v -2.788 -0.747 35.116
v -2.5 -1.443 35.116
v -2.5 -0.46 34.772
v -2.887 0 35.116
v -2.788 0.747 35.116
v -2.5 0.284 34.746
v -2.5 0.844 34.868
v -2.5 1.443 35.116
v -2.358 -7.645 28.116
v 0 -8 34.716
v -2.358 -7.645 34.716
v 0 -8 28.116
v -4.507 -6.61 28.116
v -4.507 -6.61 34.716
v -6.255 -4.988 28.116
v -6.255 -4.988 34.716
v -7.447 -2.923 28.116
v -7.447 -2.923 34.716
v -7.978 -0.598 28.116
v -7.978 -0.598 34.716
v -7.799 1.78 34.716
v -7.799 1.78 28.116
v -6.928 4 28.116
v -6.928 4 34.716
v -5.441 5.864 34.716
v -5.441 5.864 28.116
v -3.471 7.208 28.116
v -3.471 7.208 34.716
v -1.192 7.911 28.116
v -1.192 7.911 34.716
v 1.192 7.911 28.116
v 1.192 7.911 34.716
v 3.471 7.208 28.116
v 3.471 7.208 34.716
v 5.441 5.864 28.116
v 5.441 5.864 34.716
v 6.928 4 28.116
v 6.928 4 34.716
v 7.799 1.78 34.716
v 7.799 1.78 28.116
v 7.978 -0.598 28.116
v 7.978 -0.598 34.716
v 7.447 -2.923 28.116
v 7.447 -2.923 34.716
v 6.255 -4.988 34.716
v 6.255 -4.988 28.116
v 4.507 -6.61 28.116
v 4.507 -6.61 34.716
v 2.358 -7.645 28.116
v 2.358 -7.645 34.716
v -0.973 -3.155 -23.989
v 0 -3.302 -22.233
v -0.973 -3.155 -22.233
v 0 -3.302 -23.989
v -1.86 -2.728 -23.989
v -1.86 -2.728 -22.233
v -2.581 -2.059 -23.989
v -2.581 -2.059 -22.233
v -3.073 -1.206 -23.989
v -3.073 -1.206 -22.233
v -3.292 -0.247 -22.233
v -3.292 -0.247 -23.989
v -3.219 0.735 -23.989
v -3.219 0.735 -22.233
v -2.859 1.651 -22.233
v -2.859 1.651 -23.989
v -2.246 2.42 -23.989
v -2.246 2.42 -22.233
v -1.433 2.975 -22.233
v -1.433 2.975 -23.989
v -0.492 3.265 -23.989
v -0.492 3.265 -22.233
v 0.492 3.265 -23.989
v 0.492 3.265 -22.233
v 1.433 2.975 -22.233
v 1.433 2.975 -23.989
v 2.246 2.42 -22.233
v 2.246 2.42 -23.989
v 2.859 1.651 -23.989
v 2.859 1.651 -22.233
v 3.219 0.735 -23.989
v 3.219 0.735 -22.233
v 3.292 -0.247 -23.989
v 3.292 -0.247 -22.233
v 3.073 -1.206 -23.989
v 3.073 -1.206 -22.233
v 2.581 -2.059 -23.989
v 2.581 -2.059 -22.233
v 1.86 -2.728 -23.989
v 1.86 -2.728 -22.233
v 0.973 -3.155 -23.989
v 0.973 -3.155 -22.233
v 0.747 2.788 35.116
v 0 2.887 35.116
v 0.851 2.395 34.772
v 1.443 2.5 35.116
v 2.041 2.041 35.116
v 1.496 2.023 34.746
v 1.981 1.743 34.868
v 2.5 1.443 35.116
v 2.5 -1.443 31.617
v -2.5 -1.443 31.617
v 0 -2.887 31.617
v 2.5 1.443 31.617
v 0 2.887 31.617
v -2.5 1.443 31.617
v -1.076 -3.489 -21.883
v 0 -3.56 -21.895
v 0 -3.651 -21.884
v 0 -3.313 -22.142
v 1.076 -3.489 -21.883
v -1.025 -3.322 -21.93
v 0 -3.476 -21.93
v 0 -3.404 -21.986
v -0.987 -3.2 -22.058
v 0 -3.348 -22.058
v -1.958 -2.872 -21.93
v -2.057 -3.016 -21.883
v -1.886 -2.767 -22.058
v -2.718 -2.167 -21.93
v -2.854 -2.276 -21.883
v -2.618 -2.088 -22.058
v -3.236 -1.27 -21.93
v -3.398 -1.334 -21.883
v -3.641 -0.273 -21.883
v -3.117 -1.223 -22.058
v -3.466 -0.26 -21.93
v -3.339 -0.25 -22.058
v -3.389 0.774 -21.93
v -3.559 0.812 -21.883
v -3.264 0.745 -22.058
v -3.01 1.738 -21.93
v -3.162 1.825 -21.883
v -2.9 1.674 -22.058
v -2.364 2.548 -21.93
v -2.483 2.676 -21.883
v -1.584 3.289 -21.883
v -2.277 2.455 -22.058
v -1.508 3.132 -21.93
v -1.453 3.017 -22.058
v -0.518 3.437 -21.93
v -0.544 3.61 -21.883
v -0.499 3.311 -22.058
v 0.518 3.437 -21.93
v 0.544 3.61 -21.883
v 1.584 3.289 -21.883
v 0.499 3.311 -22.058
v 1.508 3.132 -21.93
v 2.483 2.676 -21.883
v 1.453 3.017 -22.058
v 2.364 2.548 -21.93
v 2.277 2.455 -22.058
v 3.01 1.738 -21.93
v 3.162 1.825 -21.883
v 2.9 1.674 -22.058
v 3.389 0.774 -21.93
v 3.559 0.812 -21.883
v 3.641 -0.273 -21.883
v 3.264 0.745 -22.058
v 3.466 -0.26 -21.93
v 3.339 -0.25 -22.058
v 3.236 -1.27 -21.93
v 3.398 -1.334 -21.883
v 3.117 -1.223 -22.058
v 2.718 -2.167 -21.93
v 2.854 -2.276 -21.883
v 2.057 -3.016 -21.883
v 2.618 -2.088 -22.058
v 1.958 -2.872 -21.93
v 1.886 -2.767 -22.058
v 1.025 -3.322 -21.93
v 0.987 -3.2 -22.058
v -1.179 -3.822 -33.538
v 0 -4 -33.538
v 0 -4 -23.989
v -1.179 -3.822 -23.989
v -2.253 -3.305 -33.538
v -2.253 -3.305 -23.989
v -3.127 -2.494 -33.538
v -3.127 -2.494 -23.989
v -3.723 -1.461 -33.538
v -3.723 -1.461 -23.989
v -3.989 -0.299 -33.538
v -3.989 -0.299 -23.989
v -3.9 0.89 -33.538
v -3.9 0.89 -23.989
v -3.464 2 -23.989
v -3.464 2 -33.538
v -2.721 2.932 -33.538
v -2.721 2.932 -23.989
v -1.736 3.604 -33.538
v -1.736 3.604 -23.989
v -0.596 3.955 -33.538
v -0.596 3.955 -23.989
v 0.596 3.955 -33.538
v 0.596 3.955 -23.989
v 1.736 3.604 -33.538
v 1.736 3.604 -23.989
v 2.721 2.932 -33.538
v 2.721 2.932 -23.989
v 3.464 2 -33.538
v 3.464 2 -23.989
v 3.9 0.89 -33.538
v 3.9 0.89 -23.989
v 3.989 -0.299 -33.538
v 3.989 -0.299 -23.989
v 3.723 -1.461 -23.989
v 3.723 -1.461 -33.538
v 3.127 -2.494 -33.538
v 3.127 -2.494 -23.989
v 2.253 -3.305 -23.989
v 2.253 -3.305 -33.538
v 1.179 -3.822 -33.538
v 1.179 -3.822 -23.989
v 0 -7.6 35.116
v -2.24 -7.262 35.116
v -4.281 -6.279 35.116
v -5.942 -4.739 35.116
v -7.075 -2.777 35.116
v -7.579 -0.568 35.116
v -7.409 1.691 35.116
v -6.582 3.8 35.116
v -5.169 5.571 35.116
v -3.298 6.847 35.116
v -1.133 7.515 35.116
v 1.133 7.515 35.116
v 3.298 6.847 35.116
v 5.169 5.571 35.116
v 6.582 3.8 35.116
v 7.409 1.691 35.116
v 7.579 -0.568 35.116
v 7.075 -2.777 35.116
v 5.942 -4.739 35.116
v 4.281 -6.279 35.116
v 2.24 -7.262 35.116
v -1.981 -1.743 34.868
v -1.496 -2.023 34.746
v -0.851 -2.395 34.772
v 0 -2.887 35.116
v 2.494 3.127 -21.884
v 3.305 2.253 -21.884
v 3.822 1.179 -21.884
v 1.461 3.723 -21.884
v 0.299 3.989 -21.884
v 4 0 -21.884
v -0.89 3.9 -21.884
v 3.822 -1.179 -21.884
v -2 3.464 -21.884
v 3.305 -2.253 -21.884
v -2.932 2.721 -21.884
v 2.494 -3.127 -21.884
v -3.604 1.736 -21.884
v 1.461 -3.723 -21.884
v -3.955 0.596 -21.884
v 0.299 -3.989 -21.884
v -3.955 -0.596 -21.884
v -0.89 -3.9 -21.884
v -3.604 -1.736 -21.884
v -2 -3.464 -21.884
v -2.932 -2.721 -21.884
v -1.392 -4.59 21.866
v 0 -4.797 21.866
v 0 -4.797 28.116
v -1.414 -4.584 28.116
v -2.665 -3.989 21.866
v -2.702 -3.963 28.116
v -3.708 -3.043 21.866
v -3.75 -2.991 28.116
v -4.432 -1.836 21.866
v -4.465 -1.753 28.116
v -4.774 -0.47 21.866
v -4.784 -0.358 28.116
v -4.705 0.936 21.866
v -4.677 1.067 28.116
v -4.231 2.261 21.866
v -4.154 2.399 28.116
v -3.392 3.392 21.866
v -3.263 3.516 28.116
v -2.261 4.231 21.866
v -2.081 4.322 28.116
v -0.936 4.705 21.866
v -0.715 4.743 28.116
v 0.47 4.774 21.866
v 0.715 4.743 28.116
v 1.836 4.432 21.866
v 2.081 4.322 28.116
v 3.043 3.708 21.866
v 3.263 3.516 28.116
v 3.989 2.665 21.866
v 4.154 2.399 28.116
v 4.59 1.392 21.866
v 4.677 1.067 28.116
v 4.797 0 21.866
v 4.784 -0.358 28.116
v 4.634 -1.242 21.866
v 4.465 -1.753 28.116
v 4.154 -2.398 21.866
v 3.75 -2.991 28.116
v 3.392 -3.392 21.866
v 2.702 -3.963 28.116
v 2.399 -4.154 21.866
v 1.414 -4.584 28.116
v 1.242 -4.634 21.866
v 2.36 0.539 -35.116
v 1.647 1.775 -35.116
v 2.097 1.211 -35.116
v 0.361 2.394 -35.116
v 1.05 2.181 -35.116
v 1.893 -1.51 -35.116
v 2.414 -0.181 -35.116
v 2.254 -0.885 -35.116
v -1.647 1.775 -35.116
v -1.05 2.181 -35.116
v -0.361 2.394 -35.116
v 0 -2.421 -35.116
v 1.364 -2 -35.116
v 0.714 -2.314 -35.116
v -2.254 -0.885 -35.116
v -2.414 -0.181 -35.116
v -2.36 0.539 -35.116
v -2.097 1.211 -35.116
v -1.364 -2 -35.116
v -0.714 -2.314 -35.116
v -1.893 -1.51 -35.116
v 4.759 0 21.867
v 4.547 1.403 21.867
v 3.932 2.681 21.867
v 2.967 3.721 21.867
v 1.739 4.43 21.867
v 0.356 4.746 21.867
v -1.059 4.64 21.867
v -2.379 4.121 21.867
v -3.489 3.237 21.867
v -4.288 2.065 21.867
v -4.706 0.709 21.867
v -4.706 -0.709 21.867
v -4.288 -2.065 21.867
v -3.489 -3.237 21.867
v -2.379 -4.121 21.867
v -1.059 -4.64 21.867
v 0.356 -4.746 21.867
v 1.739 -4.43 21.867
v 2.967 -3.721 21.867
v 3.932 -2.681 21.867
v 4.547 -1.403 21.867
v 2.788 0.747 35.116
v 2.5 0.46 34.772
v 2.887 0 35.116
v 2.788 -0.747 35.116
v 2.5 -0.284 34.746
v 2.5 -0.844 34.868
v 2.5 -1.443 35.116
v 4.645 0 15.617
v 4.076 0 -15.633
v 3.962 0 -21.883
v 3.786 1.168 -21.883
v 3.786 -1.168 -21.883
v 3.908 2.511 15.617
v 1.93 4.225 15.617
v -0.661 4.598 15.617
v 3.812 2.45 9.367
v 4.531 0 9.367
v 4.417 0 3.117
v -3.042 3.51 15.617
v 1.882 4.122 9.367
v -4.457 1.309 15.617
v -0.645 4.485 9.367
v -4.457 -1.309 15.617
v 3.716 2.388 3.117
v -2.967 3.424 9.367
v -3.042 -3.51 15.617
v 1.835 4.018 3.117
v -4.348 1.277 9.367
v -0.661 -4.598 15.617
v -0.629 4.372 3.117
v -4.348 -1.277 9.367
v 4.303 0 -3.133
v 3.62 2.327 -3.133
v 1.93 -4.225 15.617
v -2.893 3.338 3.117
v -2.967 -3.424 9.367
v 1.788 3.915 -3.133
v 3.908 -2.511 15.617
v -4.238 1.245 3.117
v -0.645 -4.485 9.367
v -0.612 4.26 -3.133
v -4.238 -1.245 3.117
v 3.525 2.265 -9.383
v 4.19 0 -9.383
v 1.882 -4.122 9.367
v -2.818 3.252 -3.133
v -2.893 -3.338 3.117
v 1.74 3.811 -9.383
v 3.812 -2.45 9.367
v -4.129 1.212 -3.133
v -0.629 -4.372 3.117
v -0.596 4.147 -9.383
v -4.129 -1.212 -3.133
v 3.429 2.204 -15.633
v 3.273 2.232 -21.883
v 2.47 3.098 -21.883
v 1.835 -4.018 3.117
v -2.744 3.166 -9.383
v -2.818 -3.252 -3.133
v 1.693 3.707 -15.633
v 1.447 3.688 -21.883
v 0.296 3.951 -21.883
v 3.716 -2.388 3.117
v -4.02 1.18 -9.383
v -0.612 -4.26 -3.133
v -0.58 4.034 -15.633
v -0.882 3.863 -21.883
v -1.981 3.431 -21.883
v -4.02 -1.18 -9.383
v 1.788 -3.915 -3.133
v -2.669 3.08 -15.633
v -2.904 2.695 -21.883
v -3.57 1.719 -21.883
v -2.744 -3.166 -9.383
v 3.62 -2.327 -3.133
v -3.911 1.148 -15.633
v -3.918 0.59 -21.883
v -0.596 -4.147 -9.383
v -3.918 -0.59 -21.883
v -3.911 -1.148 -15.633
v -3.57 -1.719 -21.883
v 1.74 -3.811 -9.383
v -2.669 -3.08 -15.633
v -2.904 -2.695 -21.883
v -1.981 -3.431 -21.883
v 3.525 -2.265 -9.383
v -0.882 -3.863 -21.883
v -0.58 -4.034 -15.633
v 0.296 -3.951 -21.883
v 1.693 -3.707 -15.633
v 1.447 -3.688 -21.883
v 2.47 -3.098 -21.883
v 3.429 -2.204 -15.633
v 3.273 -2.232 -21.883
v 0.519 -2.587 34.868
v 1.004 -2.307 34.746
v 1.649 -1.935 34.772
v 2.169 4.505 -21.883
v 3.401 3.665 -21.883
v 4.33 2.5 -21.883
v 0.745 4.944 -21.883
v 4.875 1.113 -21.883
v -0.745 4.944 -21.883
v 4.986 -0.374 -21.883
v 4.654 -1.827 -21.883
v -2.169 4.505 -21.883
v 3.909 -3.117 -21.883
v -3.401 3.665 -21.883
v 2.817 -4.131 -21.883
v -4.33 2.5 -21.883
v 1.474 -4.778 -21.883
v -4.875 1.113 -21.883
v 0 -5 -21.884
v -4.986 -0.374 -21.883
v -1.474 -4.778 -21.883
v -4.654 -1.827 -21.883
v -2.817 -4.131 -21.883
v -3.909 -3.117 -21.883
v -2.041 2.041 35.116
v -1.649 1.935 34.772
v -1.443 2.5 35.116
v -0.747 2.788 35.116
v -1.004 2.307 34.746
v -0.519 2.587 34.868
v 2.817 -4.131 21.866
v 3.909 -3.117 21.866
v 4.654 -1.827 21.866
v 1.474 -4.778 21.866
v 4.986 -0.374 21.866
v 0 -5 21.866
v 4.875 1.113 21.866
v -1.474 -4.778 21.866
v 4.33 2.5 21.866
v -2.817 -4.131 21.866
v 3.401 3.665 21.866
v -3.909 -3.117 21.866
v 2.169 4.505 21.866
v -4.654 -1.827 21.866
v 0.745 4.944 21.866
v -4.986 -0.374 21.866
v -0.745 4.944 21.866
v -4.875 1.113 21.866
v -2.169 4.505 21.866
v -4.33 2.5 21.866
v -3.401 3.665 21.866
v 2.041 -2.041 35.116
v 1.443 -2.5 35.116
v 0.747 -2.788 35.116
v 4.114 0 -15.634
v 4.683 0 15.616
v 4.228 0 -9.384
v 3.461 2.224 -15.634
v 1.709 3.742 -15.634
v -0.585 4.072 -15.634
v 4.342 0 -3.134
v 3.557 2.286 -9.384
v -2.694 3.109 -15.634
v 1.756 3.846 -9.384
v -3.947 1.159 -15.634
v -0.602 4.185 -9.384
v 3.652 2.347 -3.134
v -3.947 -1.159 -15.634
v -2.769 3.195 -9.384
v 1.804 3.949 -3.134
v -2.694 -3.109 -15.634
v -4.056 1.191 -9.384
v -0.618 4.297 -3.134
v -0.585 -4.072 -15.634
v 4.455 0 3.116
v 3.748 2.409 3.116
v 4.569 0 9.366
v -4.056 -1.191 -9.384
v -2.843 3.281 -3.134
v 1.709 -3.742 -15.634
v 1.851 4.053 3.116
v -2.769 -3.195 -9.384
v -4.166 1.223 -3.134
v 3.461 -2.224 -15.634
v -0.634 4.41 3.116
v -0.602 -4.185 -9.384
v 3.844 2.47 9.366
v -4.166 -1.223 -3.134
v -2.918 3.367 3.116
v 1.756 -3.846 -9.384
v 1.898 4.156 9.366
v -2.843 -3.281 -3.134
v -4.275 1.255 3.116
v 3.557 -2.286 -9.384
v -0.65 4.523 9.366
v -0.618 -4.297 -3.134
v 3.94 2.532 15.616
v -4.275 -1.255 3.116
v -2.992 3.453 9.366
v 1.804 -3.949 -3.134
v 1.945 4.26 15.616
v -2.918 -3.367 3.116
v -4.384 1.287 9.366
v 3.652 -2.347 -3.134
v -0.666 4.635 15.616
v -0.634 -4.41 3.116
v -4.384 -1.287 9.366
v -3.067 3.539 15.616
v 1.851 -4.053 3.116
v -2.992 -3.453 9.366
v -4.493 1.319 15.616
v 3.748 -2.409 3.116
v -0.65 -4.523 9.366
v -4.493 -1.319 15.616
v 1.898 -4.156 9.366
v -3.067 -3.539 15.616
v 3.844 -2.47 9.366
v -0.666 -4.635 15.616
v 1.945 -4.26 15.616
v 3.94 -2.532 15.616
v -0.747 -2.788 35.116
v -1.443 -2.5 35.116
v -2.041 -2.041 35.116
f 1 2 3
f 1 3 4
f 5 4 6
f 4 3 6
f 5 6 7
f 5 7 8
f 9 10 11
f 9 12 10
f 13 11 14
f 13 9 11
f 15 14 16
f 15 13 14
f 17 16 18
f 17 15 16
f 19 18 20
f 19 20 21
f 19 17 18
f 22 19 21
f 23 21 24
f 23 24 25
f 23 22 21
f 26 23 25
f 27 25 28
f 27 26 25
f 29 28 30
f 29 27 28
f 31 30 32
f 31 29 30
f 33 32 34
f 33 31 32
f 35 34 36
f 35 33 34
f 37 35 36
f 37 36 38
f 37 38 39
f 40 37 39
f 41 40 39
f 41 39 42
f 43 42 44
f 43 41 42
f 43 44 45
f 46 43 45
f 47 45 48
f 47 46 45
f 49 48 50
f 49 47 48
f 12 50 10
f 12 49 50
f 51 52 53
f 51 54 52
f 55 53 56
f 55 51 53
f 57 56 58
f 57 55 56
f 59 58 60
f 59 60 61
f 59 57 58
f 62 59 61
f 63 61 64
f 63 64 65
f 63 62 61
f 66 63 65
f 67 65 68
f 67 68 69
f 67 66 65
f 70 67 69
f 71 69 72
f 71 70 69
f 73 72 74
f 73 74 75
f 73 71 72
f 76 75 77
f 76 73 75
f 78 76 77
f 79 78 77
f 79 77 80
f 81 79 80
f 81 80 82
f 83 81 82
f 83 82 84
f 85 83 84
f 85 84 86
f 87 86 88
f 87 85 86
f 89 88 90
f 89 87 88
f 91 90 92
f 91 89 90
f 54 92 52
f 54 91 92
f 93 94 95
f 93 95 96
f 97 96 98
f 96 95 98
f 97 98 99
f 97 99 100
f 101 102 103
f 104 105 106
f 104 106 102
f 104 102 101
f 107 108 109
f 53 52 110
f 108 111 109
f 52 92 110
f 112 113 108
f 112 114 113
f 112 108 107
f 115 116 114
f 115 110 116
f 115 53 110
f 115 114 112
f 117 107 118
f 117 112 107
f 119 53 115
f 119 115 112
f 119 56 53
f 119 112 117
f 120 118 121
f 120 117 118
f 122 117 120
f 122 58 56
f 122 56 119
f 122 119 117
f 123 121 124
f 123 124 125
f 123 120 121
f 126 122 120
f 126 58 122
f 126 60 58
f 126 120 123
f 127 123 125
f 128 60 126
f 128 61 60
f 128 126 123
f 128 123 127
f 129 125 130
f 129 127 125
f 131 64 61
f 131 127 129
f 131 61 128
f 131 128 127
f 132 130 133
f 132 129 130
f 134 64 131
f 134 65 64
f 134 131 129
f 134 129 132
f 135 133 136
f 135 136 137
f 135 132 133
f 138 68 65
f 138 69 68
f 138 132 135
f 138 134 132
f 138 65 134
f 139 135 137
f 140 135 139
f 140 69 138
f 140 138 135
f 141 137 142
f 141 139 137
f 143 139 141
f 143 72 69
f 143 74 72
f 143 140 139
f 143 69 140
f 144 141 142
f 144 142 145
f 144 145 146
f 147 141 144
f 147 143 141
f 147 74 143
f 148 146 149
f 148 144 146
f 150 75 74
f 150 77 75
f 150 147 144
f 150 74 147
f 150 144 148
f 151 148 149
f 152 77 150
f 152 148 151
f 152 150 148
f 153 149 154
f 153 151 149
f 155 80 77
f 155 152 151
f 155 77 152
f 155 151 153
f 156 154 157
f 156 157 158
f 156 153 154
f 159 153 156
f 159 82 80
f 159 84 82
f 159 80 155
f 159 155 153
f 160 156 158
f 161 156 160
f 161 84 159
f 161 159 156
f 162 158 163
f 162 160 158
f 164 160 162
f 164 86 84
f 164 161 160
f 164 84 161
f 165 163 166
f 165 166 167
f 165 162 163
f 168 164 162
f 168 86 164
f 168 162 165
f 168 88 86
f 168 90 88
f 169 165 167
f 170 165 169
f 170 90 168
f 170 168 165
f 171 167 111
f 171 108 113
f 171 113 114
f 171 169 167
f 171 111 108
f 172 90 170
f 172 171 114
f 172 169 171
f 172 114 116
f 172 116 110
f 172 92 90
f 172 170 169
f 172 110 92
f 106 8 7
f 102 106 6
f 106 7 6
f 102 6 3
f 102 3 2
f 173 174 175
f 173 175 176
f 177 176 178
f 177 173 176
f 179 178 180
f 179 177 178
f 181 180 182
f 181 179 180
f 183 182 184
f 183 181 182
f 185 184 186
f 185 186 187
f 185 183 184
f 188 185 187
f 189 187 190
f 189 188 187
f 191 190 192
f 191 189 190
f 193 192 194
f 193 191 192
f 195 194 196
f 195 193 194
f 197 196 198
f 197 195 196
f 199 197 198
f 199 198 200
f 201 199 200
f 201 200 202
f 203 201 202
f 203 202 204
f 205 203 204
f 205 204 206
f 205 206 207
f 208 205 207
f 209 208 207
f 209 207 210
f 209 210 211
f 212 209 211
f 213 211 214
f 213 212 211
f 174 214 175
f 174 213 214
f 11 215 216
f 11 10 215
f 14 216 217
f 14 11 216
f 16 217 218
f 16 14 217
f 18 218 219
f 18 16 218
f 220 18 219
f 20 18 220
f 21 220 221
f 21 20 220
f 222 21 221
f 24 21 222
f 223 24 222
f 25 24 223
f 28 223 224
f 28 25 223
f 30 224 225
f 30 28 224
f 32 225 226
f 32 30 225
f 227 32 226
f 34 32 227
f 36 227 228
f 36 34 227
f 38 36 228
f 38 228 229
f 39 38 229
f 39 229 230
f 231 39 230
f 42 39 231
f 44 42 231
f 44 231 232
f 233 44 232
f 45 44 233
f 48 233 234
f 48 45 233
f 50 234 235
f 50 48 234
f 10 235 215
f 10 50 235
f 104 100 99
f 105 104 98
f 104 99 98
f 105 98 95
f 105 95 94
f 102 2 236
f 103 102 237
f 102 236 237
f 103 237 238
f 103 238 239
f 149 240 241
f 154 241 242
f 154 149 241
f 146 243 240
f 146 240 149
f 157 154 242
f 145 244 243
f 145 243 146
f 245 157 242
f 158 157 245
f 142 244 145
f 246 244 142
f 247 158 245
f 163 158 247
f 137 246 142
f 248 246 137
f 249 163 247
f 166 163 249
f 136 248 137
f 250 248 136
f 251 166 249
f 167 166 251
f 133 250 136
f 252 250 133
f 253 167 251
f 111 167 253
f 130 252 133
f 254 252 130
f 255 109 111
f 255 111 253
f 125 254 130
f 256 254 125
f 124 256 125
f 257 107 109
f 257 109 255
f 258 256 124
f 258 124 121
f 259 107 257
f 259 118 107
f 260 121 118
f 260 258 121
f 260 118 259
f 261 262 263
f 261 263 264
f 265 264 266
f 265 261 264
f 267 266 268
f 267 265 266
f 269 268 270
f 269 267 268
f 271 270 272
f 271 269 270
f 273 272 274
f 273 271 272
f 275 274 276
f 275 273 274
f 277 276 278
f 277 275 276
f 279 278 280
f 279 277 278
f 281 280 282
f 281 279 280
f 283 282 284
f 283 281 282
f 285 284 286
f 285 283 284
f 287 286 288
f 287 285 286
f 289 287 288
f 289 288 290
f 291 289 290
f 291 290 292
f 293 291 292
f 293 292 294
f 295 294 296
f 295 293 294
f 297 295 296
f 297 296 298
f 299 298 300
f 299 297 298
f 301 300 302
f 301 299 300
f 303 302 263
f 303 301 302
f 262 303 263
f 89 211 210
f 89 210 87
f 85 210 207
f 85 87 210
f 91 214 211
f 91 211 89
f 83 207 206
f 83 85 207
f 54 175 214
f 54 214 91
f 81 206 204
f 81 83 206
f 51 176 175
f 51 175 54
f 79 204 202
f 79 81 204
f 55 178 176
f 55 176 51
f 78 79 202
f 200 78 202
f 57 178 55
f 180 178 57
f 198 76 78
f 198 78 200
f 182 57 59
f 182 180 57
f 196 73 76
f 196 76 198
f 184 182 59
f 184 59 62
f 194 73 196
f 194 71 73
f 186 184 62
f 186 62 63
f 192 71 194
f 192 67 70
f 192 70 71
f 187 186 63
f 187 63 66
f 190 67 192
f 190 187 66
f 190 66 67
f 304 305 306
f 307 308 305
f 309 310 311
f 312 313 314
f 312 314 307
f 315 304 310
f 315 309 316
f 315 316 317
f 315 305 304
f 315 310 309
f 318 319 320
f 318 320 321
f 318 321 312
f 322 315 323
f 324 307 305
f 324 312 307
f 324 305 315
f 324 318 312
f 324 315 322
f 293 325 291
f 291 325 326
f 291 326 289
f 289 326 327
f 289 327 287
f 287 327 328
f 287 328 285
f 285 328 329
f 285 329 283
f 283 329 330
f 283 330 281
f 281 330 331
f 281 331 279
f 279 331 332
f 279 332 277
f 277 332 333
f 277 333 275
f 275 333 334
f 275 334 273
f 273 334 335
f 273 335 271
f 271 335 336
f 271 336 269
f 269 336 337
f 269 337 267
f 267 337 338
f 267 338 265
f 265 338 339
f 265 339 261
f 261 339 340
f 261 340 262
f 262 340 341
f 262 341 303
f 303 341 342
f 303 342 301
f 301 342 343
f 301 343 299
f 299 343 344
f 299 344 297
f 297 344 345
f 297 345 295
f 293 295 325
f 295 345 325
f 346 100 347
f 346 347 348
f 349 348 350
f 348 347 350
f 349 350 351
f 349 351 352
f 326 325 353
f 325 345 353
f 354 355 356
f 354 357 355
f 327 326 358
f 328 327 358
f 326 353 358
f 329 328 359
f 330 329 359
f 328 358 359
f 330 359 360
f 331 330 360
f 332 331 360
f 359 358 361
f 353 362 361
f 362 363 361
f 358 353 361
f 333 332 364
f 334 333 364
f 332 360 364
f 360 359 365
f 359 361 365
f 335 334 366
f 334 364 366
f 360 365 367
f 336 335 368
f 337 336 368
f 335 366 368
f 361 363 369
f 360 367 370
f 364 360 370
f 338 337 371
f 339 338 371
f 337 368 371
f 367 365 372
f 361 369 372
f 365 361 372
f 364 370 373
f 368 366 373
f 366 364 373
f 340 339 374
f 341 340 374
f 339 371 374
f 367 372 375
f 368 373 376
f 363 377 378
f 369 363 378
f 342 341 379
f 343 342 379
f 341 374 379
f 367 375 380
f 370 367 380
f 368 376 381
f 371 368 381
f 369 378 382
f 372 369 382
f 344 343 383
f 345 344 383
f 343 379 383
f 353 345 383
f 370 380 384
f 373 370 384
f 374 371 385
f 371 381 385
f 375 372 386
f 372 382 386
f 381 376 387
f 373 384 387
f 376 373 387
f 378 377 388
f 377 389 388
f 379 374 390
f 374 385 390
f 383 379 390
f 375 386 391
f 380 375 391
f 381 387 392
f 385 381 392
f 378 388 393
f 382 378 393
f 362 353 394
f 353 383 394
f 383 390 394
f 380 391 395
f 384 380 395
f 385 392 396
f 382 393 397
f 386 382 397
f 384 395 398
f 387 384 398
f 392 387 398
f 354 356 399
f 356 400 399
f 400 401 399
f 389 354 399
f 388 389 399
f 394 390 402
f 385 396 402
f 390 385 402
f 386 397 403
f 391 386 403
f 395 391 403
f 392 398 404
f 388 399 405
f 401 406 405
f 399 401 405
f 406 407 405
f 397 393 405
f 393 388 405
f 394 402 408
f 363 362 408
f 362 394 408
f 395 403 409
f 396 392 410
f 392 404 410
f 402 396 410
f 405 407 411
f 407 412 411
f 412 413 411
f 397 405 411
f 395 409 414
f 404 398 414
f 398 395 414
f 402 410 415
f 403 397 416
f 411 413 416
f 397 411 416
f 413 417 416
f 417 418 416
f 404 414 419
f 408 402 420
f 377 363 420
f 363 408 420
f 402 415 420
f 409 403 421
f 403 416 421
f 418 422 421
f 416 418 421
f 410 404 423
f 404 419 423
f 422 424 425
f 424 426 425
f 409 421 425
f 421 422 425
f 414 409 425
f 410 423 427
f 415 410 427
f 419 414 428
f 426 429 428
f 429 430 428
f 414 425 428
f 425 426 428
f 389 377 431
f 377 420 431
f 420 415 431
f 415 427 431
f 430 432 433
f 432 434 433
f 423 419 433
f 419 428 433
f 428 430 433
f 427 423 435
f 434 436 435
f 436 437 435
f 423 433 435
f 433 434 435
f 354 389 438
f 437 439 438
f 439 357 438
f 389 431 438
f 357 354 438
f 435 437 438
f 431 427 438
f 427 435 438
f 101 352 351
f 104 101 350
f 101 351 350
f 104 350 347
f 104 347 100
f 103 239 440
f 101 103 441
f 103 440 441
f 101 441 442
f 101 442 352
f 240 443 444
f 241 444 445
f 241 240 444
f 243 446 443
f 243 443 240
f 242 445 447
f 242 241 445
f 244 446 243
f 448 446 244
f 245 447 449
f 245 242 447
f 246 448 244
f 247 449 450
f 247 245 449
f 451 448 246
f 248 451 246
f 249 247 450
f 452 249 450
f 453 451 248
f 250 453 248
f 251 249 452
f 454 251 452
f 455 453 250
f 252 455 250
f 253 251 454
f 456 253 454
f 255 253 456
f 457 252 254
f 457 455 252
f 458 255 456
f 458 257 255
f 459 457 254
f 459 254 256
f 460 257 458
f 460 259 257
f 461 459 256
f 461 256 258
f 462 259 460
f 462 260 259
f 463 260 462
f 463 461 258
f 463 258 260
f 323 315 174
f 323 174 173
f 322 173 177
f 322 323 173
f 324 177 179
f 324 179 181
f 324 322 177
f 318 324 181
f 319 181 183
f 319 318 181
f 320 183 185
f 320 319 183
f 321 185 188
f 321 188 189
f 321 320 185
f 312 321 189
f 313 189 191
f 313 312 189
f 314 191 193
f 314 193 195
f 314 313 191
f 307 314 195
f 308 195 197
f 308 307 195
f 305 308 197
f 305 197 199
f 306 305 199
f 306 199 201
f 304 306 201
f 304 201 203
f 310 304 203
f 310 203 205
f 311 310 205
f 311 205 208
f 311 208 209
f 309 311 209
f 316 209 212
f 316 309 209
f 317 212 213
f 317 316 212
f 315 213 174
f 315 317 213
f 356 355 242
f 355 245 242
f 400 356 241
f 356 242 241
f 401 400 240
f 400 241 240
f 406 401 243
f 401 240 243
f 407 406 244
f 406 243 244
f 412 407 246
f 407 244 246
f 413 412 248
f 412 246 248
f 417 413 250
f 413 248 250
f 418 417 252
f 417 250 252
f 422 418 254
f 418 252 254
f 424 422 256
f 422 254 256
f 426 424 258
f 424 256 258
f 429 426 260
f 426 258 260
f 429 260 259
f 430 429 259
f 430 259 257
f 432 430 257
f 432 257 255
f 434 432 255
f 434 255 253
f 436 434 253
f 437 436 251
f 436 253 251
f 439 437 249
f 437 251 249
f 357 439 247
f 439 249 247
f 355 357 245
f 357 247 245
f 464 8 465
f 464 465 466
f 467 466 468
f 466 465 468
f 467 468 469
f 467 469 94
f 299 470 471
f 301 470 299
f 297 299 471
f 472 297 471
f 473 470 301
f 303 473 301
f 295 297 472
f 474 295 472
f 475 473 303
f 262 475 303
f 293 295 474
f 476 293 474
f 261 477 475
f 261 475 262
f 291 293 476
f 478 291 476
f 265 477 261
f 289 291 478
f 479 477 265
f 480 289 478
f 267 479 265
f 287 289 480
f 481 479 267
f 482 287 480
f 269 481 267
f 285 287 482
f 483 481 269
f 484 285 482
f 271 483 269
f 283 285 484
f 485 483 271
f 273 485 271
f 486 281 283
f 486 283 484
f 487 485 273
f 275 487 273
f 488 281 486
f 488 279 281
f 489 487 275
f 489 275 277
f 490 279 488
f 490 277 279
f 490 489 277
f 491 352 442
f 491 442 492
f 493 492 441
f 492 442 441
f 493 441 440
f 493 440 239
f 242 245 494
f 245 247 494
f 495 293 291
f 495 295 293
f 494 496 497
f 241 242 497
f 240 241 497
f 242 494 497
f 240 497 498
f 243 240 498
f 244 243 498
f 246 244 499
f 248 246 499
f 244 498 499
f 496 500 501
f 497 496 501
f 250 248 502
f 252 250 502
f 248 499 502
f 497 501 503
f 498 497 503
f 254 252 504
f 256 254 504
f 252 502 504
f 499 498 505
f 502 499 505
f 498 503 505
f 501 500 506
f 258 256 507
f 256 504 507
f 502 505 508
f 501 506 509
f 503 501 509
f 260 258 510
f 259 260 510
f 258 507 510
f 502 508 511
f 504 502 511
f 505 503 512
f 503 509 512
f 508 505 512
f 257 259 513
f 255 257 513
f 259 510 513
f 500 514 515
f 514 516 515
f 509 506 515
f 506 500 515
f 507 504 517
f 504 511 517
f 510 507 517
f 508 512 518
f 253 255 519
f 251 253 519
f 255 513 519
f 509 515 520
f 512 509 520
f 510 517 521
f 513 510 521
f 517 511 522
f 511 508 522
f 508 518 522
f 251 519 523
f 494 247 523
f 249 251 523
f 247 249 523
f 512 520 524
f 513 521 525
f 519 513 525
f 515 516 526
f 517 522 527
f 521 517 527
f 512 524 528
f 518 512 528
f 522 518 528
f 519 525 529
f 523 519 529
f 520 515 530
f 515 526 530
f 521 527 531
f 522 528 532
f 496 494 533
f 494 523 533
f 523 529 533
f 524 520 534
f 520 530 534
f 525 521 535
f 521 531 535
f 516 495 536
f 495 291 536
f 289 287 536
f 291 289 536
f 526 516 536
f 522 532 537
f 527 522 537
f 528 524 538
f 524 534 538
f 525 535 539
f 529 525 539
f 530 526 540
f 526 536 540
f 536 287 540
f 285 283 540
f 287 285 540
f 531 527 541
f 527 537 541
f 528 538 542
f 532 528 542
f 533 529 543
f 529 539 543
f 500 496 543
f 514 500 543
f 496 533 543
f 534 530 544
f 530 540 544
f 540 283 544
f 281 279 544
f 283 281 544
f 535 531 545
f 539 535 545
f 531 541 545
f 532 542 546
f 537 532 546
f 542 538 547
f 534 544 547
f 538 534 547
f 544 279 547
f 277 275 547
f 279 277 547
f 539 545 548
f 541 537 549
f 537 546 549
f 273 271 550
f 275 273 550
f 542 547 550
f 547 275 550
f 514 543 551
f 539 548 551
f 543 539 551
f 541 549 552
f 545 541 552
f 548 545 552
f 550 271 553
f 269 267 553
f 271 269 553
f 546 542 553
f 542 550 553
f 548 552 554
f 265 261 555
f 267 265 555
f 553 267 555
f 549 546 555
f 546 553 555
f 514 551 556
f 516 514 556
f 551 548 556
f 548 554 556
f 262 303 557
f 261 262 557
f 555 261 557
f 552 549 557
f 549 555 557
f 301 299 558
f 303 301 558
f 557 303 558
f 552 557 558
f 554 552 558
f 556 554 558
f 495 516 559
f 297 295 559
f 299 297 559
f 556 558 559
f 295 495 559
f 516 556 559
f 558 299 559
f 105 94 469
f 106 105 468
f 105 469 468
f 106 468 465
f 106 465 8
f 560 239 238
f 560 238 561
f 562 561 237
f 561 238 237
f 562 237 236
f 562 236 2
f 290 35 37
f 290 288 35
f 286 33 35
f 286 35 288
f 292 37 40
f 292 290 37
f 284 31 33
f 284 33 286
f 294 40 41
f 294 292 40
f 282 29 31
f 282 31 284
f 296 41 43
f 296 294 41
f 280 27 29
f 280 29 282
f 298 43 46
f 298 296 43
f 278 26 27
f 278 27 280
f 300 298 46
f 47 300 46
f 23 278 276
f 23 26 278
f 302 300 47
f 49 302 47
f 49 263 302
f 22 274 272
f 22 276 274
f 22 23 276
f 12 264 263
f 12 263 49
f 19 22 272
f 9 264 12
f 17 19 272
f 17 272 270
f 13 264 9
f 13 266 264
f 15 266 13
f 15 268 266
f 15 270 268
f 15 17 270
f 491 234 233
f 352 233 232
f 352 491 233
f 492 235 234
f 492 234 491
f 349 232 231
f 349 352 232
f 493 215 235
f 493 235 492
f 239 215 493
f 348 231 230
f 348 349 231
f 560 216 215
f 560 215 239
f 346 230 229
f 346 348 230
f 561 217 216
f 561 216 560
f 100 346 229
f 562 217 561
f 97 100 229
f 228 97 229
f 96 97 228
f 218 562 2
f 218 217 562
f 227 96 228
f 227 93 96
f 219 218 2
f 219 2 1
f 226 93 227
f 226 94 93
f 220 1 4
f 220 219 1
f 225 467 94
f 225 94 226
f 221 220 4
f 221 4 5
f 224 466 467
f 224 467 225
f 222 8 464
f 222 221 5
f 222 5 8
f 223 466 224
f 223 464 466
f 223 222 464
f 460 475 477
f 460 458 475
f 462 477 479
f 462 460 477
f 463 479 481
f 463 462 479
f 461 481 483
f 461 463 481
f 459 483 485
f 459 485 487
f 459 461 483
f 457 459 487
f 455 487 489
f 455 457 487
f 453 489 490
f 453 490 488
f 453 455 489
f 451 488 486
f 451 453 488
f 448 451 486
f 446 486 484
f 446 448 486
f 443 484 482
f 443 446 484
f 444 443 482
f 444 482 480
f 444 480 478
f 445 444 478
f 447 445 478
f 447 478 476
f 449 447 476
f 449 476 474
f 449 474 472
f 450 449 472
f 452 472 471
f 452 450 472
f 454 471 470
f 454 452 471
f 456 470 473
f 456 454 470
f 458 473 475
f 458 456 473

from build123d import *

# Parameters (mm, degrees)
CUT_EXTRUDE1_START = 35.1165
CUT_EXTRUDE1_DEPTH = 3.5
CHAMFER2_SIZE      = 1.578938402


# Read off the part's stored shape, not the designer's step: Cut-Revolve-Thin1
with BuildPart() as part:
    # Sketch3 → Revolve1 (revolve)
    with BuildSketch(Plane(origin=(0, 0, 0), x_dir=(0, 0, -1), z_dir=(1, 0, 0)), mode=Mode.PRIVATE) as revolve1_sk:
        with BuildLine():
            Line((-35.1165, 0), (-35.1165, 7.48))
            Line((-35.1165, 7.48), (-35.1165, 8))
            Line((-35.1165, 8), (-28.6365, 8))
            Line((-28.6365, 8), (-28.1165, 8))
            Line((-28.1165, 8), (-28.1165, 4.797))
            Line((-28.1165, 4.797), (-21.8665, 4.797))
            Line((-21.8665, 4.797), (-21.8665, 5))
            Line((-21.8665, 5), (21.8835, 5))
            Line((21.8835, 5), (21.8835, 3.650794))
            ThreePointArc((21.8835, 3.650794), (21.985780069, 3.403868069), (22.232706, 3.301588))
            Line((22.232706, 3.301588), (23.988751203, 3.301588))
            Line((23.988751203, 3.301588), (23.988751203, 4))
            Line((23.988751203, 4), (34.179, 4))
            Line((34.179, 4), (35.1165, 4))
            Line((35.1165, 4), (35.1165, 0))
            Line((35.1165, 0), (-35.1165, 0))
        make_face()
    revolve(revolve1_sk.sketch.rotate(Axis((0, 0, 35.1165), (0, 0, -1)), 180), axis=Axis((0, 0, 35.1165), (0, 0, -1)))

    # Cut-Revolve-Thin1 outline → Cut-Revolve-Thin1 (revolve, cut)
    with BuildSketch(Plane.XZ):
        Polygon((4.75890632, 21.867193958), (3.96190632, -21.882806042), (4, -21.8835), (4.797, 21.8665), align=None)
    revolve(axis=Axis((0, 0, 0), (0, 0, 1)), mode=Mode.SUBTRACT)

    # Sketch4 → Cut-Extrude1 (cut)
    with BuildSketch(Plane.XY.offset(CUT_EXTRUDE1_START)):
        Polygon((0, 2.886751346), (-2.5, 1.443375673), (-2.5, -1.443375673), (0, -2.886751346), (2.5, -1.443375673), (2.5, 1.443375673), align=None)
    extrude(amount=-CUT_EXTRUDE1_DEPTH, mode=Mode.SUBTRACT)

    # Cut-Extrude2 cone 1 section (through the dimple's axis) → Cut-Extrude2 (revolve, cut)
    with BuildSketch(Plane(origin=(0, 0, 35.1165), x_dir=(0, -1, 0), z_dir=(1, 0, 0))):
        Polygon((0, 0), (2.886751346, 0), (0, 2.886751346), align=None)
    revolve(axis=Axis((0, 0, 35.1165), (0, 0, -1)), mode=Mode.SUBTRACT)

    # Chamfer2
    chamfer2_edges = [part.edges().sort_by_distance(p)[0] for p in [
        (0, 4, -35.1165),
    ]]
    chamfer(chamfer2_edges, length=CHAMFER2_SIZE)

    # Sketch10 → Cut-Revolve2 (revolve, cut)
    with BuildSketch(Plane(origin=(0, 0, 0), x_dir=(0, 0, -1), z_dir=(1, 0, 0)), mode=Mode.PRIVATE) as cut_revolve2_sk:
        Polygon((-35.1165, 7.6), (-34.7165, 8), (-35.1165, 8), align=None)
    revolve(cut_revolve2_sk.sketch.rotate(Axis((0, 0, 35.1165), (0, 0, -1)), 180), axis=Axis((0, 0, 35.1165), (0, 0, -1)), mode=Mode.SUBTRACT)


solid = part.part
